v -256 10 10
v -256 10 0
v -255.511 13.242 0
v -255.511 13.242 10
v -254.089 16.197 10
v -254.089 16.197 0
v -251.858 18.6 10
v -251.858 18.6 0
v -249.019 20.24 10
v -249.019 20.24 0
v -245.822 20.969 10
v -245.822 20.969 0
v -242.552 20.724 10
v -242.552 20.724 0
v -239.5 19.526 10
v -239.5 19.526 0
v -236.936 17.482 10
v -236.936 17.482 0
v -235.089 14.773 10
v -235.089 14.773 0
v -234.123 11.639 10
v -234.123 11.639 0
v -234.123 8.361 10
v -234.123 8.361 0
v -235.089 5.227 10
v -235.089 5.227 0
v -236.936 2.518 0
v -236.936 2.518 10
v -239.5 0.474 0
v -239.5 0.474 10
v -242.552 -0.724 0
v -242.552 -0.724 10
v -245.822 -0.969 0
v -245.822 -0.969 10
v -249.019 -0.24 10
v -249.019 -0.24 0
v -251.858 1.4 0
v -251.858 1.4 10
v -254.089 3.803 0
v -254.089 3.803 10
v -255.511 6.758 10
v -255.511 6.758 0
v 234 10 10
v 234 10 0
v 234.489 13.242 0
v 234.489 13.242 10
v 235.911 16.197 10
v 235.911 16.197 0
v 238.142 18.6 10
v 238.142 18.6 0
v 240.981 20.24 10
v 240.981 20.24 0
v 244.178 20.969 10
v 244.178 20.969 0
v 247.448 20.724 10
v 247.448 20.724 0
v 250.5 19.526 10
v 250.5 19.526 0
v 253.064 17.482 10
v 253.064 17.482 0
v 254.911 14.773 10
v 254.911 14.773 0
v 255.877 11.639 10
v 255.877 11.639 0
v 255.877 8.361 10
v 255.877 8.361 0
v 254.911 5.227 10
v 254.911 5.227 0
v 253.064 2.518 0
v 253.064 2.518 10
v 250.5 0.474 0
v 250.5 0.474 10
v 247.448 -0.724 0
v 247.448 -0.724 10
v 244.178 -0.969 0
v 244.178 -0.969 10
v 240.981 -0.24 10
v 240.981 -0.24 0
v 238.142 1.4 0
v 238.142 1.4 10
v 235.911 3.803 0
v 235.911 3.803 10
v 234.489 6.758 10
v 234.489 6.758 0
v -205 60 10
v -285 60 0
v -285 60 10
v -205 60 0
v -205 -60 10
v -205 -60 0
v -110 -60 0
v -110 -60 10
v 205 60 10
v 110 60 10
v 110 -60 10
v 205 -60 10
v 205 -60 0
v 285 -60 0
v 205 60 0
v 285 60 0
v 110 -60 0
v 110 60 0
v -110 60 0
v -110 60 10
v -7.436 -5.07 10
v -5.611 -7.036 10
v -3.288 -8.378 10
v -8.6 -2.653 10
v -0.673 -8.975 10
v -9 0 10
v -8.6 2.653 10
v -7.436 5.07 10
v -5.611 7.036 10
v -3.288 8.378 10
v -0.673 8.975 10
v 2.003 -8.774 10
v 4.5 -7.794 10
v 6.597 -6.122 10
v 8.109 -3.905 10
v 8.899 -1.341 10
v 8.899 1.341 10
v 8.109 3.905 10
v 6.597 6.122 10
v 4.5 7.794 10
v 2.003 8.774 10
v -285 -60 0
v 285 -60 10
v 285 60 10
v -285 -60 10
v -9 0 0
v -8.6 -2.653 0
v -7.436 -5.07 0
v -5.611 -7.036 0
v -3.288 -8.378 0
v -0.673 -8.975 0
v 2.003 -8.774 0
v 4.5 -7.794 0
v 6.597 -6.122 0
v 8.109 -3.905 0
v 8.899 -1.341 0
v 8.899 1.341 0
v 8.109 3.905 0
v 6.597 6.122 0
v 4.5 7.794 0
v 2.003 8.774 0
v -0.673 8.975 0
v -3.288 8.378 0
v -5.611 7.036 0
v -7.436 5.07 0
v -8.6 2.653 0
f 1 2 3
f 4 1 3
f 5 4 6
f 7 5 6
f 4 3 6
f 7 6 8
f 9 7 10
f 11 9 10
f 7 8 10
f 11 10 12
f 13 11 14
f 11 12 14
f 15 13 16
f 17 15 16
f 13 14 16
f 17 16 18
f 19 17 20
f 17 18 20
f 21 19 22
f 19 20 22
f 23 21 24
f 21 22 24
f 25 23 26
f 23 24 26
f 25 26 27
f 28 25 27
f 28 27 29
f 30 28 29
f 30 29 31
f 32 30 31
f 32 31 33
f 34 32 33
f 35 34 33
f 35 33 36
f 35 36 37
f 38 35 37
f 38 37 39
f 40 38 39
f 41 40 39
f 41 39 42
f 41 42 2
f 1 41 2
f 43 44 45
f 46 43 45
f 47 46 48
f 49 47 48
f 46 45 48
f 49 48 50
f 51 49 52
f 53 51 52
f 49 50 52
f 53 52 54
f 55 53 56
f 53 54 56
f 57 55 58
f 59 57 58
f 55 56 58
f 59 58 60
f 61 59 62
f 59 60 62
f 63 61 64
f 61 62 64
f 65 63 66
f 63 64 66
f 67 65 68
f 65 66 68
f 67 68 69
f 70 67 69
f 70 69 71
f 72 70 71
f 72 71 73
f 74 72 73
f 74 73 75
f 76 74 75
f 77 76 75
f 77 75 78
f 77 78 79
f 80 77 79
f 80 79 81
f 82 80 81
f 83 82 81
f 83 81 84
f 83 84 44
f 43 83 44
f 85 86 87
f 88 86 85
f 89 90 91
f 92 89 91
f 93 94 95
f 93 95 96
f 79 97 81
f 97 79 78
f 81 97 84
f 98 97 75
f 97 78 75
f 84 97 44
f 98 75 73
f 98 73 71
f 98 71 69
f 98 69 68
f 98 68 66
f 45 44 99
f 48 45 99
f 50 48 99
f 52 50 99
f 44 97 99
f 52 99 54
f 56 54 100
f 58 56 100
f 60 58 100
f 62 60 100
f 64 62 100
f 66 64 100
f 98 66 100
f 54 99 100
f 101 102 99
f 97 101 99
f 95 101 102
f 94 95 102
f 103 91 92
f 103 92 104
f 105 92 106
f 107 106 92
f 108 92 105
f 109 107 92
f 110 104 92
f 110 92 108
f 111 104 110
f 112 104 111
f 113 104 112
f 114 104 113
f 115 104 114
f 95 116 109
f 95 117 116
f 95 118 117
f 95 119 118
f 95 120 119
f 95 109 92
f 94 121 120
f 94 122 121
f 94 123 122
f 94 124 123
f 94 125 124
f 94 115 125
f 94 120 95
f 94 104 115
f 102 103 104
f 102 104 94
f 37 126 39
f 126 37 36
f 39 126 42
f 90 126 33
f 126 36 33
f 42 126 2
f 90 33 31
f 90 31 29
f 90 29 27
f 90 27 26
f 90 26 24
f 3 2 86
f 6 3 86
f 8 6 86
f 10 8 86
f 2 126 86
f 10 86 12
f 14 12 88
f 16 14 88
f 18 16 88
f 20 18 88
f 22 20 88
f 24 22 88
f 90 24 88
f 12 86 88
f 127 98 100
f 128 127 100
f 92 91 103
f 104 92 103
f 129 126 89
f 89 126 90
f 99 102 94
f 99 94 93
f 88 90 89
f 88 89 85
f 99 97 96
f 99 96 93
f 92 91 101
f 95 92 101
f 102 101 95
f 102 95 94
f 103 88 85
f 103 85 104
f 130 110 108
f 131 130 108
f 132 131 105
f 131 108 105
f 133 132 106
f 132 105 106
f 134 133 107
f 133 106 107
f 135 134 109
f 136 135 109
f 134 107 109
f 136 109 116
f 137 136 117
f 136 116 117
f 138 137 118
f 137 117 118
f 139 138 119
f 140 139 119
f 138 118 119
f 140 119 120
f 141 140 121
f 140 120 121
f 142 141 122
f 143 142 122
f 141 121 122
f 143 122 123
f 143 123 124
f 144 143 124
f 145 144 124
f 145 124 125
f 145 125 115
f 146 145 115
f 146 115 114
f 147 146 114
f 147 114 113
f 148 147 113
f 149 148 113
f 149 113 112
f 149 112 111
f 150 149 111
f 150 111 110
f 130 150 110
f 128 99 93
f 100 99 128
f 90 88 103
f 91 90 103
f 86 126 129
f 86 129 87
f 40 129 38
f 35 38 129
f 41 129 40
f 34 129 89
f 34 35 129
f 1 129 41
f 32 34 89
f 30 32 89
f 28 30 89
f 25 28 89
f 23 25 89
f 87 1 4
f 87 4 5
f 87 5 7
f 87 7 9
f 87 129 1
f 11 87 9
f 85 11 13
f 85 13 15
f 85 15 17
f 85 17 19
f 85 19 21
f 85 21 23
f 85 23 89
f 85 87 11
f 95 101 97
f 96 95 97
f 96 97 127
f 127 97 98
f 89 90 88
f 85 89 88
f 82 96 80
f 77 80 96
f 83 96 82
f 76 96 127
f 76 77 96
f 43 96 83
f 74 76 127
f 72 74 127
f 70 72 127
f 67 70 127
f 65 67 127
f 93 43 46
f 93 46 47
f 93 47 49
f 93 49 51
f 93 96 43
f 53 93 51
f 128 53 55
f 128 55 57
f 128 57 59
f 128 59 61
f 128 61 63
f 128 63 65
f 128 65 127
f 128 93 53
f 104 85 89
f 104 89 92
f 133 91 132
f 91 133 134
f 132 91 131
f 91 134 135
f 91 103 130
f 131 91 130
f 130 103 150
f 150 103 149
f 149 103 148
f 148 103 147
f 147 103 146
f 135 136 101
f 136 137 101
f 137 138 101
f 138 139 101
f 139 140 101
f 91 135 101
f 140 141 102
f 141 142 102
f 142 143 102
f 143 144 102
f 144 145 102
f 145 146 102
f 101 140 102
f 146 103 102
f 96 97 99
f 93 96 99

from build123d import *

# Parameters (mm, degrees)
F0_W     = 80
F0_H     = 120
F1_DEPTH = 10
F0_W_2   = 220
F2_DEPTH = 10
F0_W_3   = 95
F3_DEPTH = 10
F5_D     = 18
F6_D     = 22


with BuildPart() as f1:
    # F0 (on Top) → F1 (new body)
    with BuildSketch(Plane.XY):
        with Locations((245, 0)):
            Rectangle(F0_W, F0_H)
        with Locations((-245, 0)):
            Rectangle(F0_W, F0_H)
    extrude(amount=F1_DEPTH)

    # F6 (through all)
    with Locations(Plane.XY.offset(10)):
        with Locations((-245, 10), (245, 10)):
            Hole(F6_D / 2)


with BuildPart() as f2:
    # F0 (on Top) → F2 (new body)
    with BuildSketch(Plane.XY):
        Rectangle(F0_W_2, F0_H)
    extrude(amount=F2_DEPTH)

    # F5 (through all)
    with Locations(Plane(origin=(0, 0, 0), x_dir=(1, 0, 0), z_dir=(0, 0, -1))):
        with Locations((0, 0)):
            Hole(F5_D / 2)


with BuildPart() as f3:
    # F0 (on Top) → F3 (new body)
    with BuildSketch(Plane.XY):
        with Locations((-157.5, 0)):
            Rectangle(F0_W_3, F0_H)
        with Locations((157.5, 0)):
            Rectangle(F0_W_3, F0_H)
    extrude(amount=F3_DEPTH)


solid = Compound([f1.part, f2.part, f3.part])
